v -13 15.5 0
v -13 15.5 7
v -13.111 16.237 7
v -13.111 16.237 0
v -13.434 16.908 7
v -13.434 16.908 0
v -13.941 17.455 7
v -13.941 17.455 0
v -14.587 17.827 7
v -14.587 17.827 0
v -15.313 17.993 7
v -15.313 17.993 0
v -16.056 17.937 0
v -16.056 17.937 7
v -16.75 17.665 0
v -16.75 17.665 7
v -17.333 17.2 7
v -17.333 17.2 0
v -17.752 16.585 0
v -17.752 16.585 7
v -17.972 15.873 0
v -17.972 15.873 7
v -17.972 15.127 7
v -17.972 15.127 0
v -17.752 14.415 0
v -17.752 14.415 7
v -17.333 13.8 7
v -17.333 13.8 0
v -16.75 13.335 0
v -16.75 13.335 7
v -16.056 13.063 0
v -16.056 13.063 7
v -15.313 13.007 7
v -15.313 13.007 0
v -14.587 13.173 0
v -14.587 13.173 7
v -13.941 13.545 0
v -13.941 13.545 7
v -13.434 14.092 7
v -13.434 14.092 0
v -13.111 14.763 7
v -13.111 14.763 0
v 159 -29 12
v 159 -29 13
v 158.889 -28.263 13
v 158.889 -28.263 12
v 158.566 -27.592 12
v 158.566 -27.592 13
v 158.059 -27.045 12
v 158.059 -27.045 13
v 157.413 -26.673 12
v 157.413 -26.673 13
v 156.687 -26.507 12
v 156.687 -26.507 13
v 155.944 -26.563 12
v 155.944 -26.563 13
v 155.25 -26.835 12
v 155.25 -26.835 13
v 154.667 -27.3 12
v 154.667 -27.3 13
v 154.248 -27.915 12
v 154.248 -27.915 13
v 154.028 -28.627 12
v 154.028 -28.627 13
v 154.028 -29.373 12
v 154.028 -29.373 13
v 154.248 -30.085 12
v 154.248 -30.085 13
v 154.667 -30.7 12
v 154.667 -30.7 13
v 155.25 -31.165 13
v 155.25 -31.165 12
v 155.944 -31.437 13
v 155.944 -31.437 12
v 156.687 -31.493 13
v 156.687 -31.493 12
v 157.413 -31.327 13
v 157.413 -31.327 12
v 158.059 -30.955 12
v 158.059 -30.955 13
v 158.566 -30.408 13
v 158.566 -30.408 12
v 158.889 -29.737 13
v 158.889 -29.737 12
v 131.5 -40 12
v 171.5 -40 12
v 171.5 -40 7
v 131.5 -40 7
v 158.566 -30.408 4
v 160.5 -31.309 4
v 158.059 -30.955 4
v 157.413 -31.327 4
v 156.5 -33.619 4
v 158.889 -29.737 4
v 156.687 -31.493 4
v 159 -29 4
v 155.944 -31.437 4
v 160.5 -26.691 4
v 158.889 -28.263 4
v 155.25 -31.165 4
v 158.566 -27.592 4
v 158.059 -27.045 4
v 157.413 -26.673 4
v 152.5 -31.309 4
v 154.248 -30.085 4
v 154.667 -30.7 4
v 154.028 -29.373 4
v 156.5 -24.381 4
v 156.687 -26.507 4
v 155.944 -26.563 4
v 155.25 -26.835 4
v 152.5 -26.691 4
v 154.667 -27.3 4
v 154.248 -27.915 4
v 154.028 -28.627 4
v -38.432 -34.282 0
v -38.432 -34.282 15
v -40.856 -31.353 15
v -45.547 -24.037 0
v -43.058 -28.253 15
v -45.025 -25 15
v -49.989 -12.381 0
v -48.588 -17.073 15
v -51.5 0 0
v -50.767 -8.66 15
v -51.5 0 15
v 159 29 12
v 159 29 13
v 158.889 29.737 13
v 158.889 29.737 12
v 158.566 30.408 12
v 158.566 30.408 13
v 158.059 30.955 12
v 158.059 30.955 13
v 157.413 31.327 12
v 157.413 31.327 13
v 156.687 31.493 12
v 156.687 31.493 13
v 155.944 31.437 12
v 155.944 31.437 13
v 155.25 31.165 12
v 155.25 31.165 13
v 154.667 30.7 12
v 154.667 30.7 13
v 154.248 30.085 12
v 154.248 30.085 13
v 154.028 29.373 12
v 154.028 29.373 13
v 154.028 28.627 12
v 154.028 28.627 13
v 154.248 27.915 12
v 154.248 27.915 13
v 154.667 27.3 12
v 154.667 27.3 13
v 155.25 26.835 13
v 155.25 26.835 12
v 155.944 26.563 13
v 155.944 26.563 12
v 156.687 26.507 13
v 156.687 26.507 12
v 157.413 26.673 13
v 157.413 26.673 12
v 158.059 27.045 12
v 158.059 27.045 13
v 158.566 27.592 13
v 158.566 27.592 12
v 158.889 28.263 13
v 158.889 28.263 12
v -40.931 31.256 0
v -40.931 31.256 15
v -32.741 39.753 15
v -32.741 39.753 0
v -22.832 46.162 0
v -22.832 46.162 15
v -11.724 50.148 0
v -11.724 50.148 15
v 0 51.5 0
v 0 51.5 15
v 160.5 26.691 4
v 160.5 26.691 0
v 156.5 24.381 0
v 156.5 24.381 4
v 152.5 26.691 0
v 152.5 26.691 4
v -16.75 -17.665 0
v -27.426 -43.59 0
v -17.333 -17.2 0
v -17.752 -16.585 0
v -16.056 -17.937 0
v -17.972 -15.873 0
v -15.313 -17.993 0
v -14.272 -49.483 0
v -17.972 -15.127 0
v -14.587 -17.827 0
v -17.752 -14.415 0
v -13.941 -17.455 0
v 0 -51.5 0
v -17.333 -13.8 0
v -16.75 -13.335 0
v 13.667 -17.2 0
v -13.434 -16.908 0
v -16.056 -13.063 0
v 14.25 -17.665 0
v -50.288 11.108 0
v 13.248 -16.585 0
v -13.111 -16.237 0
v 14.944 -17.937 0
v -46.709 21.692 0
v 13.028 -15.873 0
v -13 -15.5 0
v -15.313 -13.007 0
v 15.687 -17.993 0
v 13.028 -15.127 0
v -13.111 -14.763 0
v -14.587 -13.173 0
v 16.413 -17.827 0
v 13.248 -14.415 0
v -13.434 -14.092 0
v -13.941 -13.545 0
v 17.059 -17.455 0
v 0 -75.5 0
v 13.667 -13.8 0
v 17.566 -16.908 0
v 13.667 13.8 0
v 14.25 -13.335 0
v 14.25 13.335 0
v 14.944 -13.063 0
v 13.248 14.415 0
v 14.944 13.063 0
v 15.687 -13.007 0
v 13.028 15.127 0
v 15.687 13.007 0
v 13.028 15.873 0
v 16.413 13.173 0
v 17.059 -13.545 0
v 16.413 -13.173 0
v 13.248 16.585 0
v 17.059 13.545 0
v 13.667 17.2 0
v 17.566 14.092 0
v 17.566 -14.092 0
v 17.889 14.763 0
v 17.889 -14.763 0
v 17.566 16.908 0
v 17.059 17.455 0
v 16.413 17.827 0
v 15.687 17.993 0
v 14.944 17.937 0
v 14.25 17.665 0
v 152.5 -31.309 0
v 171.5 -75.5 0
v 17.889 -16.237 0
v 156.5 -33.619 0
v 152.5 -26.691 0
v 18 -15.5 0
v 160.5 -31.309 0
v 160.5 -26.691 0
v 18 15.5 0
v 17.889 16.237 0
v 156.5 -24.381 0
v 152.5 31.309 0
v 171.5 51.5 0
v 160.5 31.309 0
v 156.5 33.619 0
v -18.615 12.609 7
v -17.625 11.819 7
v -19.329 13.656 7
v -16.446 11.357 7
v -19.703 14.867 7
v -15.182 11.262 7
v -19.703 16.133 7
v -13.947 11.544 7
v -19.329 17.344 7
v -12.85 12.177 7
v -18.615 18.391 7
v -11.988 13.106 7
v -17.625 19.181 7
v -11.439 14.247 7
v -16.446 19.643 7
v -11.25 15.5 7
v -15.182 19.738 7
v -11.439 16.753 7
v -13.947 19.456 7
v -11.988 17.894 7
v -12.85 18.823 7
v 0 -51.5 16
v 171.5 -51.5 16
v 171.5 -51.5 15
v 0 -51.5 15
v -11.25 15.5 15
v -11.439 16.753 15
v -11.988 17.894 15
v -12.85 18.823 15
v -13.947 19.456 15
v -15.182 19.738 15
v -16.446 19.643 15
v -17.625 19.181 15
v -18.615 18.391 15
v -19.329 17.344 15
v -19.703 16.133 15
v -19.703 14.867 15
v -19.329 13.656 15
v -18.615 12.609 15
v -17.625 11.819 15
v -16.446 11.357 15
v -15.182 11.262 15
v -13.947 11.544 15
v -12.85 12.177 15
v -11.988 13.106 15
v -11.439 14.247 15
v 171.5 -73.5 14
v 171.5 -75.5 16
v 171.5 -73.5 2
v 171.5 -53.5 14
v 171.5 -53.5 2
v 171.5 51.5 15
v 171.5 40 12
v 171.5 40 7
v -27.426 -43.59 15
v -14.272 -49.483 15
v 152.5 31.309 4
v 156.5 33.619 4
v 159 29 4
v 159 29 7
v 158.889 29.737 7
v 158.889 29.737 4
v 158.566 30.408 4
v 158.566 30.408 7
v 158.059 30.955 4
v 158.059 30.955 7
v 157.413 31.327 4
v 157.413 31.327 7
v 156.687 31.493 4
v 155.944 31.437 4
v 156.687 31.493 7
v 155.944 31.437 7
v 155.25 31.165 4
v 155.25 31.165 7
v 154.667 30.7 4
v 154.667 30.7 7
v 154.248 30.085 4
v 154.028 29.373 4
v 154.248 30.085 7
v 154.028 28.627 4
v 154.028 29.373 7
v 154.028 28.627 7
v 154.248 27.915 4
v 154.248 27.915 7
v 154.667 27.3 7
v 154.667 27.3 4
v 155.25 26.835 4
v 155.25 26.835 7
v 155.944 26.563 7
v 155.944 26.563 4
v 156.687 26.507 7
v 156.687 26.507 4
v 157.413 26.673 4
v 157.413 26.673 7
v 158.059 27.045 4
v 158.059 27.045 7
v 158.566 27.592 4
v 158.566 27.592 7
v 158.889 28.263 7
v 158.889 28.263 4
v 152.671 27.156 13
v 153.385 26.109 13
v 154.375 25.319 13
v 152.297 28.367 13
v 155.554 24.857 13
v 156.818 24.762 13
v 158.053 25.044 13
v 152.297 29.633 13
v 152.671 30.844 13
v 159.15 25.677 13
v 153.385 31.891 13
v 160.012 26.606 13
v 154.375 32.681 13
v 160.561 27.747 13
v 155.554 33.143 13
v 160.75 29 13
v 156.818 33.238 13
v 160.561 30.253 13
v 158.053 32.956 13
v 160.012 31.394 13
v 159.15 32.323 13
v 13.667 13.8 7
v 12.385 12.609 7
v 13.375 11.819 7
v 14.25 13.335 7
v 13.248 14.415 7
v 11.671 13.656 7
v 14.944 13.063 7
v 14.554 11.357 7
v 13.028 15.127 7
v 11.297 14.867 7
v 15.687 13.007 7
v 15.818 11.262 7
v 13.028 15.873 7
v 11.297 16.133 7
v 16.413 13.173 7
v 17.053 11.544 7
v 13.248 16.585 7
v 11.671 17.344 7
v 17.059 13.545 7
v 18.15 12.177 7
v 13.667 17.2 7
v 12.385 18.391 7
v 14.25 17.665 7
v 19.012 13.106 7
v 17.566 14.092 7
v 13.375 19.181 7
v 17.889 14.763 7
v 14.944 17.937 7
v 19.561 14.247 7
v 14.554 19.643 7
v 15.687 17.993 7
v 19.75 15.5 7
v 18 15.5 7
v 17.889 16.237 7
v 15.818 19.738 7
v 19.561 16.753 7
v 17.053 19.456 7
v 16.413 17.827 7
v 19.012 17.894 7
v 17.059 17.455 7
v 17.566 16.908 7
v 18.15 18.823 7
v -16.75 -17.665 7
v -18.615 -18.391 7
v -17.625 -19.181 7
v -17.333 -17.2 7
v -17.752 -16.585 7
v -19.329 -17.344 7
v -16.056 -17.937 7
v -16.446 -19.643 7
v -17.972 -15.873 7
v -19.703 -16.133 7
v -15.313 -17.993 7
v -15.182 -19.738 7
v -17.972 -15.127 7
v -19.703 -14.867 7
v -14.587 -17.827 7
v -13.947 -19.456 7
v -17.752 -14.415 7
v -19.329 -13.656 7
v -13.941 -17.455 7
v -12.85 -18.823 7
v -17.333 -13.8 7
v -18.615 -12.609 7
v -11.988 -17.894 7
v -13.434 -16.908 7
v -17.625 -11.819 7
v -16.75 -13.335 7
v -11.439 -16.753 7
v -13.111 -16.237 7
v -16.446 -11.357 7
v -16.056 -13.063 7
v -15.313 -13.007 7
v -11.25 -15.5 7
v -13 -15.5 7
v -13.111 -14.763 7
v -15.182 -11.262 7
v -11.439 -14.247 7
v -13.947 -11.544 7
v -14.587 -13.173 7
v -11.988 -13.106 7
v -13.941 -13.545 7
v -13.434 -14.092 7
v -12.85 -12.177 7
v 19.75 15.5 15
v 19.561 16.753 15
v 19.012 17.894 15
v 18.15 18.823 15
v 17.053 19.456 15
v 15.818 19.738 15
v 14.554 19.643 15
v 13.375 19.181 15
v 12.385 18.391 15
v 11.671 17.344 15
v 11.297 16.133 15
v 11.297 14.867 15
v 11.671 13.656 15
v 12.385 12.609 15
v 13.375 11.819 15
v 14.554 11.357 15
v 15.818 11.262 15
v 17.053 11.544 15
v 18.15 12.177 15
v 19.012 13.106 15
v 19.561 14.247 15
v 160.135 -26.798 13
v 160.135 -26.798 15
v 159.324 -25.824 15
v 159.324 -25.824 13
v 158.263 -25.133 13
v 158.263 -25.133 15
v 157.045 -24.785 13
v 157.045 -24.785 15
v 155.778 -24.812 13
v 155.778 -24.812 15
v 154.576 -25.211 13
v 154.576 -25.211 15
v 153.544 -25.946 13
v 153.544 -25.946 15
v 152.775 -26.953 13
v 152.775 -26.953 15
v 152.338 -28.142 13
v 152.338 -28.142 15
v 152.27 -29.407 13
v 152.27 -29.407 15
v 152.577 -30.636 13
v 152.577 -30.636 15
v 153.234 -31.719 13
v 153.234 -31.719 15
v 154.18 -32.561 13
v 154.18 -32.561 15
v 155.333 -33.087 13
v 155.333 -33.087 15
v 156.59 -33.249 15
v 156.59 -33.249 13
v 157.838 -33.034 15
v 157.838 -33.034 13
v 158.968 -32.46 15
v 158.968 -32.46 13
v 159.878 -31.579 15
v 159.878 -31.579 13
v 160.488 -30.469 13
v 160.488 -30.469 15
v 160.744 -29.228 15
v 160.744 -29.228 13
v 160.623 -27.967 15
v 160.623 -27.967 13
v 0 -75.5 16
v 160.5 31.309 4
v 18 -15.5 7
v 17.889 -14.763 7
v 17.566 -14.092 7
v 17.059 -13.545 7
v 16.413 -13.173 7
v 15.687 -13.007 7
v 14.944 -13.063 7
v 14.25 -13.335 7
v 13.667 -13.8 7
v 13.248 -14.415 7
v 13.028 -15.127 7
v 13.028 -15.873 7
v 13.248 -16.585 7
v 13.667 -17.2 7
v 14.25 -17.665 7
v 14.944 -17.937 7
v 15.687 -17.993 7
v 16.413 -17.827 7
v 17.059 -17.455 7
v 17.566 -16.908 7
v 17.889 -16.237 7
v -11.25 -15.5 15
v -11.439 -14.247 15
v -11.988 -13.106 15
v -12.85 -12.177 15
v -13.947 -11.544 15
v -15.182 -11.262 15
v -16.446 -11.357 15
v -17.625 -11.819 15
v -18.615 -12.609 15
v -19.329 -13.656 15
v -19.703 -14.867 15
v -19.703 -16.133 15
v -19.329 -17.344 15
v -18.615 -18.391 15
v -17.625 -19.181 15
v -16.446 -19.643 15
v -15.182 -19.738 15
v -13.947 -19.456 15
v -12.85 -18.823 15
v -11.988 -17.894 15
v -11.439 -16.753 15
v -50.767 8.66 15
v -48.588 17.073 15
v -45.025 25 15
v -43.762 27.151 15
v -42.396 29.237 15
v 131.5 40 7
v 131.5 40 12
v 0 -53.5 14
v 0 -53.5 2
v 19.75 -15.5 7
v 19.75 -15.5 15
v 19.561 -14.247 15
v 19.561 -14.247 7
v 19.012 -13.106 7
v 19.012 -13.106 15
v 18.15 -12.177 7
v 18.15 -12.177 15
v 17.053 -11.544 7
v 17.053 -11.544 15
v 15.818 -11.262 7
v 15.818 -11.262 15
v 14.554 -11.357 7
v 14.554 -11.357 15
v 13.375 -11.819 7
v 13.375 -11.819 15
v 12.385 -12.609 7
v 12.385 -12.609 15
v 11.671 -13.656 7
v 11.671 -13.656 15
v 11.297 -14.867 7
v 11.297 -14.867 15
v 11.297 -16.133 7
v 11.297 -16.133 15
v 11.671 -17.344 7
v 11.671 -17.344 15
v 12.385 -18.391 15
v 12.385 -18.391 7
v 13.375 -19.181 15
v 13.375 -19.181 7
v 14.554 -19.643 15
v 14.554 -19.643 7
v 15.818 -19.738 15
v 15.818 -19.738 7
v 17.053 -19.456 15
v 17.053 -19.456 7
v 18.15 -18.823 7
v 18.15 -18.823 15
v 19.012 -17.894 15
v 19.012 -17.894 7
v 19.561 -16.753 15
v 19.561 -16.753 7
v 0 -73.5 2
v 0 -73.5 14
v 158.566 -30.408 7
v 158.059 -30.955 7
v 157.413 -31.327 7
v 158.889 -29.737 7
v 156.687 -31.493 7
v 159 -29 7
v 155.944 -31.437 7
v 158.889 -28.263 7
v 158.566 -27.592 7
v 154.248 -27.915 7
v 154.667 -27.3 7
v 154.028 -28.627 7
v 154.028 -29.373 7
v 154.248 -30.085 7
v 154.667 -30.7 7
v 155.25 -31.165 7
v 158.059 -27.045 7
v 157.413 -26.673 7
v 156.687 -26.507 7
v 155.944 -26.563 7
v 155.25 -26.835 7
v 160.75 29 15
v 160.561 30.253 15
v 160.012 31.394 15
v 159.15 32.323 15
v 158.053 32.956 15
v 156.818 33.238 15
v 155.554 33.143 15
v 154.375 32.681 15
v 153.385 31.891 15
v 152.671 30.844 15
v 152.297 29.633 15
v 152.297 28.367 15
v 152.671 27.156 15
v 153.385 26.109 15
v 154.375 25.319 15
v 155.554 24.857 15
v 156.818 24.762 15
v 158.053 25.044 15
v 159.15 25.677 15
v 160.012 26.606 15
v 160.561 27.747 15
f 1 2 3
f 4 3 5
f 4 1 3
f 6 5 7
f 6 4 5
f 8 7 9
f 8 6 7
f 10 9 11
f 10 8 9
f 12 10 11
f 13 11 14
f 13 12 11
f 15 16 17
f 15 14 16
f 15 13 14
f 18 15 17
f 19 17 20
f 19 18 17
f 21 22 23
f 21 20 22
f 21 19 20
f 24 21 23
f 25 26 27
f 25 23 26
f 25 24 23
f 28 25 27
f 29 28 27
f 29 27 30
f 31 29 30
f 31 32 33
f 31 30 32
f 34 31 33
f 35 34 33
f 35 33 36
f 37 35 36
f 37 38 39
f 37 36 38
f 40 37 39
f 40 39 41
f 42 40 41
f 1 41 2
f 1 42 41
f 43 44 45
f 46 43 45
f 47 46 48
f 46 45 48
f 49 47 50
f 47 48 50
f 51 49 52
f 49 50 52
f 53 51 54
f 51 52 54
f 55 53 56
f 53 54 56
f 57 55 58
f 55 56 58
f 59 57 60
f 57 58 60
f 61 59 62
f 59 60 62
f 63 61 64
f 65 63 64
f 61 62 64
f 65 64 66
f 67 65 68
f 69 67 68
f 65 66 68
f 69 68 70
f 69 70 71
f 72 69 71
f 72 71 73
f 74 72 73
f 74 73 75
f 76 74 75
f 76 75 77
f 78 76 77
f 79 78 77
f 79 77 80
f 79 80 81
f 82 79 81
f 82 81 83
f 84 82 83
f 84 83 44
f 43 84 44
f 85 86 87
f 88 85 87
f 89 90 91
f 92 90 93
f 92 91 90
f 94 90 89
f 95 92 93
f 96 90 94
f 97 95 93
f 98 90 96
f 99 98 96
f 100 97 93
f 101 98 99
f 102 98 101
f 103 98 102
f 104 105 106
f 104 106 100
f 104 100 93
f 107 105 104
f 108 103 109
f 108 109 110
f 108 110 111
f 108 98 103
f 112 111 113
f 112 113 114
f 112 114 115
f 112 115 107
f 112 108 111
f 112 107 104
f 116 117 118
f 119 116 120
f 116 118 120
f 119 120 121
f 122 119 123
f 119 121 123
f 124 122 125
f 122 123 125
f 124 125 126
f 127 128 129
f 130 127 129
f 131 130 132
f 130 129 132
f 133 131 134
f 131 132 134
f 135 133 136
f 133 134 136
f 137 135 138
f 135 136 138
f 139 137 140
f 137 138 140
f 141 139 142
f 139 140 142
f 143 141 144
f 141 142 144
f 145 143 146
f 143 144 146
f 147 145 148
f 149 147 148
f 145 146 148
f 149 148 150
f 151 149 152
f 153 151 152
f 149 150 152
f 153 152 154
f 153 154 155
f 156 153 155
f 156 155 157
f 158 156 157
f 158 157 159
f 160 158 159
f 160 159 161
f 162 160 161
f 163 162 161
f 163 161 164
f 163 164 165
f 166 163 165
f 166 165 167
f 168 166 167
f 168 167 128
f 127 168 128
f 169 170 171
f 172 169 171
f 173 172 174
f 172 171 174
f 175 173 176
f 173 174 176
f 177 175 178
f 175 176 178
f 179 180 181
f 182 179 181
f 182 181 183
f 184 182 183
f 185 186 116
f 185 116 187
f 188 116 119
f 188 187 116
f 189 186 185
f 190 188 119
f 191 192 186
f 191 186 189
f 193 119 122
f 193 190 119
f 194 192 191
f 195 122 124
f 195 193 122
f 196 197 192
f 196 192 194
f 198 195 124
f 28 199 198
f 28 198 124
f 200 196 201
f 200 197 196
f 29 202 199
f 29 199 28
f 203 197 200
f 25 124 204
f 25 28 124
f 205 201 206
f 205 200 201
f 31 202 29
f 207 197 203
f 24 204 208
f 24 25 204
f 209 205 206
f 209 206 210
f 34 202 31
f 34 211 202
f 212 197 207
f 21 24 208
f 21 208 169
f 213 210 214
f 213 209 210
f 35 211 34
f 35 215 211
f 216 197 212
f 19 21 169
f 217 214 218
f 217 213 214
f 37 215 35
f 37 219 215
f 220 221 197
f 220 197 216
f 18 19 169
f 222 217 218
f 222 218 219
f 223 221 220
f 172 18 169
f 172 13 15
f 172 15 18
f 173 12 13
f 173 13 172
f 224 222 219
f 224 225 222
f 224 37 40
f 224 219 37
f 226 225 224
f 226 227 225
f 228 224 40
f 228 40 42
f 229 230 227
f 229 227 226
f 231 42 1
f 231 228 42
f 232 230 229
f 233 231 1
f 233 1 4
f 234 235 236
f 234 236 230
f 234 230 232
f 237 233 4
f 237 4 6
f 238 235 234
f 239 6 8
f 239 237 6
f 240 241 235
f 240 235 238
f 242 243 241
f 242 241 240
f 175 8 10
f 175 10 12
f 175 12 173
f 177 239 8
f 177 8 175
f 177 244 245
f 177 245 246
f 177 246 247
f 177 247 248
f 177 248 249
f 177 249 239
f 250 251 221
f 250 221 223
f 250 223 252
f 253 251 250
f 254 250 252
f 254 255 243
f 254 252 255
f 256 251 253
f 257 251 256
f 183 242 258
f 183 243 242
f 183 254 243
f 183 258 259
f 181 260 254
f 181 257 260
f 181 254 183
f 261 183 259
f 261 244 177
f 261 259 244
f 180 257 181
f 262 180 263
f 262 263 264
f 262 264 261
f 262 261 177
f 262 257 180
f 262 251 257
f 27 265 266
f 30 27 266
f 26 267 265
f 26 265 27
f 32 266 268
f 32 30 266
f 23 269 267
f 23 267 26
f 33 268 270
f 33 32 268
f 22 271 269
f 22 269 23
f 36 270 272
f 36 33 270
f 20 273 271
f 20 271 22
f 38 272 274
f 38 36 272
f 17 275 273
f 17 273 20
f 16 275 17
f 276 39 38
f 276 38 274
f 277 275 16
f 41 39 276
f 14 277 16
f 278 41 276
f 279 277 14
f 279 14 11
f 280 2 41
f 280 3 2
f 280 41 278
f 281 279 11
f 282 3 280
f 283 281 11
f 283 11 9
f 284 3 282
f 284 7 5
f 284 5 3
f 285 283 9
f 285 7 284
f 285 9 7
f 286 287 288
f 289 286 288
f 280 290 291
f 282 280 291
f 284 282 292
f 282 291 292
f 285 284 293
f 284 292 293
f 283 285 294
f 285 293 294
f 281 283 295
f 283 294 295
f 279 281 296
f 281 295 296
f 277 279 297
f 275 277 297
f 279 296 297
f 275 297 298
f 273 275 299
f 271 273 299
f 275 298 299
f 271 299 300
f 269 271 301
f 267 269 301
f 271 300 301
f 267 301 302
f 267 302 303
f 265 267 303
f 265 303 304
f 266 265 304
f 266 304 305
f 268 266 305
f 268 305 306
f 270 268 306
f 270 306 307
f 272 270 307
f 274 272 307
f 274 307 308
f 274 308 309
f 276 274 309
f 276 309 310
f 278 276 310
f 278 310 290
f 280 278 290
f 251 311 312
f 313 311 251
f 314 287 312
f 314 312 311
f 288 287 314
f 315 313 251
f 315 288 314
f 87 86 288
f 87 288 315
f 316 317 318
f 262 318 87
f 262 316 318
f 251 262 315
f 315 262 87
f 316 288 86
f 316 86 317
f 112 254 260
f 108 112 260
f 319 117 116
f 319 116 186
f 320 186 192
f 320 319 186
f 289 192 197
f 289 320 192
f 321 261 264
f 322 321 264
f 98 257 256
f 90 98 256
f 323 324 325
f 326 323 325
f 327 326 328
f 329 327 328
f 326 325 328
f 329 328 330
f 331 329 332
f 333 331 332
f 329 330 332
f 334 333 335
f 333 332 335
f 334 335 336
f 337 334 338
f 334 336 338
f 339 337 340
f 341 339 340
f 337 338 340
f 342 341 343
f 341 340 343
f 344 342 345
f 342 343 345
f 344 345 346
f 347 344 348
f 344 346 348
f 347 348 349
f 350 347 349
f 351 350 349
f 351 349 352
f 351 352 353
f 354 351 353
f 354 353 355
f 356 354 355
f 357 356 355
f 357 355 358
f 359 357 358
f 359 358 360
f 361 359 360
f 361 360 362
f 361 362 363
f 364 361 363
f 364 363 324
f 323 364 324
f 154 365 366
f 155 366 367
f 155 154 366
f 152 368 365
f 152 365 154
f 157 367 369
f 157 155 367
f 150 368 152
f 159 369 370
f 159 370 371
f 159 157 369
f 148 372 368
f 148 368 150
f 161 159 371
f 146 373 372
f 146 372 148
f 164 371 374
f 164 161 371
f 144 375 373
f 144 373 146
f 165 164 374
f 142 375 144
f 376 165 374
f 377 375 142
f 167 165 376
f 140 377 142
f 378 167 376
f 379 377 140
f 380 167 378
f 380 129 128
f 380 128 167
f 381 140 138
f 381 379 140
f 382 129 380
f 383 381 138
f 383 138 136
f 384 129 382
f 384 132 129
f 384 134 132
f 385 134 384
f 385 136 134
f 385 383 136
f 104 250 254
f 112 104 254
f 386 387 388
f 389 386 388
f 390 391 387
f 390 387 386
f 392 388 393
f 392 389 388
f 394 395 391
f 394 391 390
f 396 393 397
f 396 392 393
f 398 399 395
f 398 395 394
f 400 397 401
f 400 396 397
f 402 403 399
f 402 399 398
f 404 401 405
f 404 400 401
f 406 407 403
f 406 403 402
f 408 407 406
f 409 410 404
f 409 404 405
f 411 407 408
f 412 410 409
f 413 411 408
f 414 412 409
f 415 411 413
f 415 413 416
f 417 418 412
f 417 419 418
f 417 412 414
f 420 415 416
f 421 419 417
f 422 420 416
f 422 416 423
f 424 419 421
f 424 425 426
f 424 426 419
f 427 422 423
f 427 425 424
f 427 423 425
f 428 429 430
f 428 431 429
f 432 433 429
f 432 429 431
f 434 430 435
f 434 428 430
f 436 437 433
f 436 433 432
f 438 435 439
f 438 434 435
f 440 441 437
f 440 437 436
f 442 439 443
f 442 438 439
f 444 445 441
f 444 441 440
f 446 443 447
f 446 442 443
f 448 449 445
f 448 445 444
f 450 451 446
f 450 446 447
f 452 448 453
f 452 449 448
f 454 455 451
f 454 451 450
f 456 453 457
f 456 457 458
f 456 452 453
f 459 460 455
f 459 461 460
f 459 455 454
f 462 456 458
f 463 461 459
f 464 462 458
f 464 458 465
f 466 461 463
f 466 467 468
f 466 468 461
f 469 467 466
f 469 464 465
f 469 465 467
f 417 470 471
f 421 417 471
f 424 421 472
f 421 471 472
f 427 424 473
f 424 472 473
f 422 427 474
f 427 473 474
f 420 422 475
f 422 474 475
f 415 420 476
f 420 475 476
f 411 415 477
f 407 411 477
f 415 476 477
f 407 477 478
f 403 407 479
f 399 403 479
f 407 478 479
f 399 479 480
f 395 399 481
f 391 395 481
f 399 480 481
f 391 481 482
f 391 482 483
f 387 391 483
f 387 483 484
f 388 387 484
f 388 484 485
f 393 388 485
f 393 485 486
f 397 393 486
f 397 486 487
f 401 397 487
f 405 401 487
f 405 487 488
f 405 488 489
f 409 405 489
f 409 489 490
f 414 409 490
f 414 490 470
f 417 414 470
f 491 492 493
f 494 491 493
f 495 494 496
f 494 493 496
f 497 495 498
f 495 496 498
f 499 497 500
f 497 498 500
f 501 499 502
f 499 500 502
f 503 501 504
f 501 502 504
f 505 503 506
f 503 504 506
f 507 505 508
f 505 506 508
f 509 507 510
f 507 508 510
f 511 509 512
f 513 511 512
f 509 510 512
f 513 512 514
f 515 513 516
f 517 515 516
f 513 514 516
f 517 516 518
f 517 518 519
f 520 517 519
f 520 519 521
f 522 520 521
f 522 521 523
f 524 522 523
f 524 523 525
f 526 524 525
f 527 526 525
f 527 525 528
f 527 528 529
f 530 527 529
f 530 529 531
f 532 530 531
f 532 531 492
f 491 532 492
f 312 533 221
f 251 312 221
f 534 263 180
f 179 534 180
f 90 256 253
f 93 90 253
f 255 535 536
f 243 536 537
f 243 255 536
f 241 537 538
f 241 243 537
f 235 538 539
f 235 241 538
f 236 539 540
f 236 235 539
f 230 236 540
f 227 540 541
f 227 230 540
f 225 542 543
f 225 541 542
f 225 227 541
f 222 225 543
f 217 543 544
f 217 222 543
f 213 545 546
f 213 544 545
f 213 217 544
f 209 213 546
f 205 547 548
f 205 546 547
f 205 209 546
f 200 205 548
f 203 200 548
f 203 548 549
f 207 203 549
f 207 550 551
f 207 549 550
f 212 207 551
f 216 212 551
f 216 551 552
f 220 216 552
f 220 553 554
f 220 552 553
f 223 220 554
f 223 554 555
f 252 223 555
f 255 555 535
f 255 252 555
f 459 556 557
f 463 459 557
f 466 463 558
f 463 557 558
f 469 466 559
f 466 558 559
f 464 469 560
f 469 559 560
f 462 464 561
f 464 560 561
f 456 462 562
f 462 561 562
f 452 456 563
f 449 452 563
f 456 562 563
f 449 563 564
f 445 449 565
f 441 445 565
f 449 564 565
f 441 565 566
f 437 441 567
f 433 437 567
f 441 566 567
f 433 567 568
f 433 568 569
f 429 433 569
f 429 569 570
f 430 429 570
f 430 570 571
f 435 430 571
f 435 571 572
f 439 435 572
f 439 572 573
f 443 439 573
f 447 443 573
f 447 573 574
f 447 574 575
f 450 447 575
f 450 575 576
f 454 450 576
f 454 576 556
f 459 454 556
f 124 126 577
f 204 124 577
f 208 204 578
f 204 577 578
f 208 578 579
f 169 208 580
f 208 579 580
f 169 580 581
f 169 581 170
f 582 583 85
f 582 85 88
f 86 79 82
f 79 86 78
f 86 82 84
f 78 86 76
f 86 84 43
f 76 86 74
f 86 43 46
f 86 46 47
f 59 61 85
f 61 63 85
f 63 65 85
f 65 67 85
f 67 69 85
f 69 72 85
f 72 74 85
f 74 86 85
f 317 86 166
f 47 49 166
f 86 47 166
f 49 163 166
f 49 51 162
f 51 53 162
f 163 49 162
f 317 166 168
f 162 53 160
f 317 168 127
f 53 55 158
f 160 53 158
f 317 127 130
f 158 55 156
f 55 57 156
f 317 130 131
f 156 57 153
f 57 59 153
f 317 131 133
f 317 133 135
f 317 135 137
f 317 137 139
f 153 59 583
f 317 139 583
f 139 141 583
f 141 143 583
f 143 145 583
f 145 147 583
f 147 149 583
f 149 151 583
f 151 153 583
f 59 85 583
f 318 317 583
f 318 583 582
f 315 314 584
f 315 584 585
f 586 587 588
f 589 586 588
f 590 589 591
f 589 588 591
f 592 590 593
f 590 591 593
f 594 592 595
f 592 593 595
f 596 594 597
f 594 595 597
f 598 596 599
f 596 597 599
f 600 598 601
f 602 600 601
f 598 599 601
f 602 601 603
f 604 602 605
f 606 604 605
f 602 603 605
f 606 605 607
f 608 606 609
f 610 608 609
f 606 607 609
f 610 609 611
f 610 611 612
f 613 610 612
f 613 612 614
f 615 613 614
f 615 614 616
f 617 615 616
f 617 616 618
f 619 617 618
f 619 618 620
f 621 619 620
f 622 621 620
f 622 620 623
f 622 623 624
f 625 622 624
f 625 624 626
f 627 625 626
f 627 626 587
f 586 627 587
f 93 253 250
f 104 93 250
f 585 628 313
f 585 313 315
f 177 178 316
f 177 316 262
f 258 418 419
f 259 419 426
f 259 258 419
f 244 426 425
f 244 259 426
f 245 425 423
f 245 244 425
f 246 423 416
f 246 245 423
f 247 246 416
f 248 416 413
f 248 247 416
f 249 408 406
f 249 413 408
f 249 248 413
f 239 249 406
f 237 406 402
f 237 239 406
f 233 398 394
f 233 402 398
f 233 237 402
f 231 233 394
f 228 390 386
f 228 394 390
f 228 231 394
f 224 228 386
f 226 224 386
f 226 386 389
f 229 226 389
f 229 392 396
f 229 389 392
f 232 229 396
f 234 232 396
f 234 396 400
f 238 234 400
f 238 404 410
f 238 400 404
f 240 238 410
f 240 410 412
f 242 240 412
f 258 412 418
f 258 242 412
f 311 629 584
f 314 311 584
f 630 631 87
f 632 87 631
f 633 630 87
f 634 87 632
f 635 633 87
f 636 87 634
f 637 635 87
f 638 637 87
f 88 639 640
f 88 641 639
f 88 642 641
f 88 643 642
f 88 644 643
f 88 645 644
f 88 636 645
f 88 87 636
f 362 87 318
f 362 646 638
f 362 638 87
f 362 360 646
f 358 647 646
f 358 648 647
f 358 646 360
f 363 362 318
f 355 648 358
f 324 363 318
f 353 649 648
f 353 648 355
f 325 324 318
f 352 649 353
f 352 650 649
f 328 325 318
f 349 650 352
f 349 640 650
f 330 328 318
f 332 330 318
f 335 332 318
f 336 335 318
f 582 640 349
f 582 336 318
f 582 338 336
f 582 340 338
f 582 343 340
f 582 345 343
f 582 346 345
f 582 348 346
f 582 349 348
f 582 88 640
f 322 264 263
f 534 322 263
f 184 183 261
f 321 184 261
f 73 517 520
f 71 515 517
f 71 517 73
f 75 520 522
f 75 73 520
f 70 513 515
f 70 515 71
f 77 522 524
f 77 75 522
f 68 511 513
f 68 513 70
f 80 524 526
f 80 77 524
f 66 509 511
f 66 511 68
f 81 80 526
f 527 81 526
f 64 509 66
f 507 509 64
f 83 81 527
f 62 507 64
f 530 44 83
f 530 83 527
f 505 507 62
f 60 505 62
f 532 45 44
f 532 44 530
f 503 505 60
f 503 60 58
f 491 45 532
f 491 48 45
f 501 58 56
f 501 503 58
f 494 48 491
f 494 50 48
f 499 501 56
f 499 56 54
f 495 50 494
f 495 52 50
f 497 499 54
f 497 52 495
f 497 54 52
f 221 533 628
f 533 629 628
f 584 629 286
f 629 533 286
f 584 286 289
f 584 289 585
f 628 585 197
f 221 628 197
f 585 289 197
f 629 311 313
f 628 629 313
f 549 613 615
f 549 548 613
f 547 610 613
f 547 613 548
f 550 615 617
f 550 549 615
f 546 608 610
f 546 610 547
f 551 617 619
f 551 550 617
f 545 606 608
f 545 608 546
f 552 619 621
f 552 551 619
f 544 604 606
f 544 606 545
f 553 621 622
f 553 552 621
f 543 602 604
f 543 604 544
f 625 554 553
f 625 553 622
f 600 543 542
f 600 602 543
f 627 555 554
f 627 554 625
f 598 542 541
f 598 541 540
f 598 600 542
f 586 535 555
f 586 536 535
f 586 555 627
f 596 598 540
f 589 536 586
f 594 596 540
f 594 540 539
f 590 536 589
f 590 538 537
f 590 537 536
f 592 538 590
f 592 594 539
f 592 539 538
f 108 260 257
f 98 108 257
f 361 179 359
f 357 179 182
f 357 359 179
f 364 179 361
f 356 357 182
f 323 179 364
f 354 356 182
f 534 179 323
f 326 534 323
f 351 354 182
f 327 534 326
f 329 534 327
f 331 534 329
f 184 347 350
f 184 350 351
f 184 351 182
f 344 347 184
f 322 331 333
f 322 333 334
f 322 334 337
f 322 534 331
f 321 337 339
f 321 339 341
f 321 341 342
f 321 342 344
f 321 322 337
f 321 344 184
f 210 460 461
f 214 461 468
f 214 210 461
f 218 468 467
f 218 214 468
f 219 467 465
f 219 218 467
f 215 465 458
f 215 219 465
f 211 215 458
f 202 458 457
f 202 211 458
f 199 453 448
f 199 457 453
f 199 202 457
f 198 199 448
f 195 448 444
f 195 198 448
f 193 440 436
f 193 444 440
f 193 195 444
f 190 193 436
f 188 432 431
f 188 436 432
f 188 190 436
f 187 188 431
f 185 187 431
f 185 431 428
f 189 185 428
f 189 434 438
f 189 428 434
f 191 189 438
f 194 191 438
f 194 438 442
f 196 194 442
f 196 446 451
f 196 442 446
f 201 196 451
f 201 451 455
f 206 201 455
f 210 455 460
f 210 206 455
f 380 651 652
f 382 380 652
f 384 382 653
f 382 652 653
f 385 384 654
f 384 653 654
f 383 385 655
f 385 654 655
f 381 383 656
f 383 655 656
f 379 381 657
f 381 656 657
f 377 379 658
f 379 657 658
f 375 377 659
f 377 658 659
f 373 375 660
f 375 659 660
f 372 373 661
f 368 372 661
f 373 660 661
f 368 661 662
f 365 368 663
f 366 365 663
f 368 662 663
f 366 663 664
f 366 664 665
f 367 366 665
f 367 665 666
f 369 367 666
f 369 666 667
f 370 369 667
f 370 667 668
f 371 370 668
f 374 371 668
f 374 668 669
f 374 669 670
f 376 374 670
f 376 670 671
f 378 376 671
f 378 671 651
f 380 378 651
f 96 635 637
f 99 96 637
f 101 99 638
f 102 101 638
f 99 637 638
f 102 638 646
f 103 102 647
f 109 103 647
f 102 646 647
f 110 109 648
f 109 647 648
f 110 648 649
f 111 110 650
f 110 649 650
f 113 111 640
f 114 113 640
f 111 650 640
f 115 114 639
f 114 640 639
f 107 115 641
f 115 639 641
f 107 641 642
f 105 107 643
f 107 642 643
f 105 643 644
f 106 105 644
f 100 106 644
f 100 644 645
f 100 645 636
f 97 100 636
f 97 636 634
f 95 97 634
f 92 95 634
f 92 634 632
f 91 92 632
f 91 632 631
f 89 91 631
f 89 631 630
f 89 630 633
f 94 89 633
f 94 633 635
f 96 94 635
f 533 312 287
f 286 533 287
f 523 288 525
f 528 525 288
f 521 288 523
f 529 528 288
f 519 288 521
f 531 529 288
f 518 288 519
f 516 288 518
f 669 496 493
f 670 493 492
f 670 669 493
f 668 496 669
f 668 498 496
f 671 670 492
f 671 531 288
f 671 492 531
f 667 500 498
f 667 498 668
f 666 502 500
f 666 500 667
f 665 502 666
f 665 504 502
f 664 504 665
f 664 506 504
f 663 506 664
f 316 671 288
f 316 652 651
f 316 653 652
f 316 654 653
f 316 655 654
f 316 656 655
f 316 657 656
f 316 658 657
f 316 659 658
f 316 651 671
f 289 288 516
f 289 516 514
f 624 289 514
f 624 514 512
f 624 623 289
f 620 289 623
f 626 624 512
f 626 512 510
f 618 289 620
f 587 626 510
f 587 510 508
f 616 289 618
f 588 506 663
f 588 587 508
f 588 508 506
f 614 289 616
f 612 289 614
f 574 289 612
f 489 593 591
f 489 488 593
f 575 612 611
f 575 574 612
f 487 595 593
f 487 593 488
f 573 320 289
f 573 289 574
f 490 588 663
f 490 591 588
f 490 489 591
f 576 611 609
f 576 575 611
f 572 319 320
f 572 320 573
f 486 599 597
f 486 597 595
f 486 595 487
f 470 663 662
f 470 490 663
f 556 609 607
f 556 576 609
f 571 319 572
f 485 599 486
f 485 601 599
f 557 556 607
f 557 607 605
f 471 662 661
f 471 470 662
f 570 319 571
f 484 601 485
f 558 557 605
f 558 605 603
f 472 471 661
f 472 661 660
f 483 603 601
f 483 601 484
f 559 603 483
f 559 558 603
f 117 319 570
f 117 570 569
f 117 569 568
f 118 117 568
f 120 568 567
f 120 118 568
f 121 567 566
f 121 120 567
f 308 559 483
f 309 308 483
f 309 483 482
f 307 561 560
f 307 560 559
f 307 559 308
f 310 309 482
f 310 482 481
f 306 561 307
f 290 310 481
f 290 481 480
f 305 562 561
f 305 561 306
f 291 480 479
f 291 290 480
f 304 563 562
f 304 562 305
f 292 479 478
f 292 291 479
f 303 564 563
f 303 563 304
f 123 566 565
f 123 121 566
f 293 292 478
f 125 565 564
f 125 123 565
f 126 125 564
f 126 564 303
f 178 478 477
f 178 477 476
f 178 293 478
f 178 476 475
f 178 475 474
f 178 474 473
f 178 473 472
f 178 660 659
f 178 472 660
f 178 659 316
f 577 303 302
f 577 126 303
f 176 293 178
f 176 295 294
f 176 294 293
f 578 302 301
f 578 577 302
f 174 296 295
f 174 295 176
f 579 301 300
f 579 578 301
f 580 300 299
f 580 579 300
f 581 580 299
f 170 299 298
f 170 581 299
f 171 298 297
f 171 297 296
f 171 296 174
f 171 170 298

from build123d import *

# Parameters (mm, degrees)
CROQUIS1_W                        = 103
CROQUIS1_H                        = 103
CROQUIS1_R                        = 2.5
SALIENTE_EXTRUIR1_DEPTH           = 15
REDONDEO2_R                       = 51.5
CROQUIS2_W                        = 15
CROQUIS2_H                        = 103
SALIENTE_EXTRUIR2_DEPTH           = 120
CROQUIS3_R                        = 4.25
CORTAR_EXTRUIR1_DEPTH             = 8
SALIENTE_EXTRUIR3_START           = -223
SALIENTE_EXTRUIR3_DEPTH           = 223
CORTAR_EXTRUIR2_DEPTH             = 181.53669987
CORTAR_EXTRUIR2_DEPTH_BACK        = 181.53669987
REDONDEO3_START                   = -23.965772234
REDONDEO3_DEPTH                   = 195.465772234
REDONDEO3_START_2                 = -45.024993159
REDONDEO3_2_DEPTH                 = 21.059220925
REDONDEO3_START_3                 = 15
REDONDEO3_3_DEPTH                 = 9
REDONDEO4_R                       = 10
CORTAR_EXTRUIR3_REACH             = 182.537
CROQUIS6_R                        = 4.25
CORTAR_EXTRUIR3_DIRECTION_2_DEPTH = 181.536699978
CORTAR_EXTRUIR4_DEPTH             = 231.022281636
CORTAR_EXTRUIR4_DEPTH_BACK        = 40
CROQUIS7_W                        = 5
CROQUIS7_H                        = 80
CROQUIS10_R                       = 4.25
CORTAR_EXTRUIR5_DEPTH             = 10
CROQUIS11_R                       = 2.5
CORTAR_EXTRUIR6_DEPTH             = 180.536904387
CROQUIS12_W                       = 16
CROQUIS12_H                       = 24
CROQUIS12_W_2                     = 12
CROQUIS12_H_2                     = 20
SALIENTE_EXTRUIR4_DEPTH           = 171.5
CORTAR_EXTRUIR7_DEPTH             = 4
CROQUIS14_W                       = 242.583484446
CROQUIS14_H                       = 103.867159029
CORTAR_EXTRUIR8_DEPTH             = 8


with BuildPart() as part:
    # Croquis1 → Saliente-Extruir1 (new body)
    with BuildSketch(Plane.XY):
        Rectangle(CROQUIS1_W, CROQUIS1_H)
        with Locations((15.5, 15.5)):
            Circle(CROQUIS1_R, mode=Mode.SUBTRACT)
        with Locations((-15.5, 15.5)):
            Circle(CROQUIS1_R, mode=Mode.SUBTRACT)
        with Locations((-15.5, -15.5)):
            Circle(CROQUIS1_R, mode=Mode.SUBTRACT)
        with Locations((15.5, -15.5)):
            Circle(CROQUIS1_R, mode=Mode.SUBTRACT)
    extrude(amount=SALIENTE_EXTRUIR1_DEPTH)

    # Redondeo2
    redondeo2_edges = [part.edges().sort_by_distance(p)[0] for p in [
        (-51.5, -51.5, 7.5),
        (-51.5, 51.5, 7.5),
    ]]
    fillet(redondeo2_edges, radius=REDONDEO2_R - 0.0001)  # a hair under: the kernel refuses the full size

    # Croquis2 → Saliente-Extruir2 (add)
    with BuildSketch(Plane(origin=(51.5, 0, 0), x_dir=(0, 0, -1), z_dir=(1, 0, 0))):
        with Locations((-7.5, 0)):
            Rectangle(CROQUIS2_W, CROQUIS2_H)
    extrude(amount=SALIENTE_EXTRUIR2_DEPTH)

    # Croquis3 → Cortar-Extruir1 (cut)
    with BuildSketch(Plane.XY.offset(15)):
        with Locations((-15.5, 15.5)):
            Circle(CROQUIS3_R)
        with Locations((15.5, 15.5)):
            Circle(CROQUIS3_R)
        with Locations((15.5, -15.5)):
            Circle(CROQUIS3_R)
        with Locations((-15.5, -15.5)):
            Circle(CROQUIS3_R)
    extrude(amount=-CORTAR_EXTRUIR1_DEPTH, mode=Mode.SUBTRACT)

    # Croquis4 → Saliente-Extruir3 (add)
    with BuildSketch(Plane(origin=(171.5, 0, 0), x_dir=(0, 0, -1), z_dir=(1, 0, 0)).offset(SALIENTE_EXTRUIR3_START)):
        Polygon((-15, -19), (-15, -25), (-23, -25), (-23, 25), (-15, 25), (-15, 19), (-19, 19), (-19, -19), align=None)
    extrude(amount=SALIENTE_EXTRUIR3_DEPTH)

    # Croquis5 → Cortar-Extruir2 (cut, two sides: drawn at the far end of the back side and taken through both)
    with BuildSketch(Plane(origin=(0, 0, 0), x_dir=(-1, 0, 0), z_dir=(0, 0, -1)).offset(-CORTAR_EXTRUIR2_DEPTH_BACK)):
        with BuildLine():
            Line((40.930864284, 31.255629077), (61.422564692, 30.315306135))
            Line((61.422564692, 30.315306135), (63.075048064, -35.056936027))
            Line((63.075048064, -35.056936027), (38.432028807, -34.281615507))
            ThreePointArc((38.432028807, -34.281615507), (48.122237498, -18.343943366), (51.5, 0))
            ThreePointArc((51.5, 0), (48.786214808, 16.497128377), (40.930864284, 31.255629077))
        make_face()
    extrude(amount=CORTAR_EXTRUIR2_DEPTH + CORTAR_EXTRUIR2_DEPTH_BACK, mode=Mode.SUBTRACT)

    # Redondeo3: read off the stored shape, not the designer's step
    # Redondeo3 outline → Redondeo3 (add)
    with BuildSketch(Plane.YZ.offset(REDONDEO3_START)):
        with BuildLine():
            Line((-25, 15), (-25, 23))
            ThreePointArc((-25, 23), (-28.473403651, 17.254033308), (-34.797958971, 15))
            Line((-34.797958971, 15), (-25, 15))
        make_face()
        with BuildLine():
            ThreePointArc((34.797958971, 15), (28.473403651, 17.254033308), (25, 23))
            Line((25, 23), (25, 15))
            Line((25, 15), (34.797958971, 15))
        make_face()
    extrude(amount=REDONDEO3_DEPTH)

    # Redondeo3 2 outline → Redondeo3 2 (add)
    with BuildSketch(Plane.YZ.offset(REDONDEO3_START_2)):
        with BuildLine():
            ThreePointArc((34.797958971, 15), (28.473403651, 17.254033308), (25, 23))
            Line((25, 23), (25, 15))
            Line((25, 15), (34.797958971, 15))
        make_face()
        with BuildLine():
            Line((-25, 15), (-25, 23))
            ThreePointArc((-25, 23), (-28.473403651, 17.254033308), (-34.797958971, 15))
            Line((-34.797958971, 15), (-25, 15))
        make_face()
    extrude(amount=REDONDEO3_2_DEPTH)

    # Redondeo3 3 outline → Redondeo3 3 (cut)
    with BuildSketch(Plane.XY.offset(REDONDEO3_START_3)):
        with BuildLine():
            Line((-45.024993159, -36), (-36.827299657, -36))
            ThreePointArc((-36.827299657, -36), (-41.294060795, -30.774186311), (-45.024993083, -24.999999958))
            Line((-45.024993083, -24.999999958), (-45.024993159, -36))
        make_face()
        with BuildLine():
            Line((-45.024993159, 36), (-45.024993083, 24.999999958))
            ThreePointArc((-45.024993083, 24.999999958), (-41.294060795, 30.774186311), (-36.827299657, 36))
            Line((-36.827299657, 36), (-45.024993159, 36))
        make_face()
    extrude(amount=REDONDEO3_3_DEPTH, mode=Mode.SUBTRACT)

    # Redondeo4
    redondeo4_edges = [part.edges().sort_by_distance(p)[0] for p in [
        (63.237503445, -25, 23),
        (63.237503445, 25, 23),
    ]]
    fillet(redondeo4_edges, radius=REDONDEO4_R)

    # Croquis6 → Cortar-Extruir3 (cut, up to next)
    with BuildSketch(Plane.XY.offset(23), mode=Mode.PRIVATE) as cortar_extruir3_sk1:
        with Locations((15.5, 15.5)):
            Circle(CROQUIS6_R)
    cortar_extruir3_tool1 = extrude(cortar_extruir3_sk1.sketch, amount=-CORTAR_EXTRUIR3_REACH, mode=Mode.PRIVATE) & part.part
    # Croquis6 → Cortar-Extruir3 (cut, up to next)
    with BuildSketch(Plane.XY.offset(23), mode=Mode.PRIVATE) as cortar_extruir3_sk2:
        with Locations((-15.5, 15.5)):
            Circle(CROQUIS6_R)
    cortar_extruir3_tool2 = extrude(cortar_extruir3_sk2.sketch, amount=-CORTAR_EXTRUIR3_REACH, mode=Mode.PRIVATE) & part.part
    # Croquis6 → Cortar-Extruir3 (cut, up to next)
    with BuildSketch(Plane.XY.offset(23), mode=Mode.PRIVATE) as cortar_extruir3_sk3:
        with Locations((15.5, -15.5)):
            Circle(CROQUIS6_R)
    cortar_extruir3_tool3 = extrude(cortar_extruir3_sk3.sketch, amount=-CORTAR_EXTRUIR3_REACH, mode=Mode.PRIVATE) & part.part
    # Croquis6 → Cortar-Extruir3 (cut, up to next)
    with BuildSketch(Plane.XY.offset(23), mode=Mode.PRIVATE) as cortar_extruir3_sk4:
        with Locations((-15.5, -15.5)):
            Circle(CROQUIS6_R)
    cortar_extruir3_tool4 = extrude(cortar_extruir3_sk4.sketch, amount=-CORTAR_EXTRUIR3_REACH, mode=Mode.PRIVATE) & part.part
    add(cortar_extruir3_tool1.solids().sort_by_distance((15.5, 15.5, 23))[0], mode=Mode.SUBTRACT)
    add(cortar_extruir3_tool2.solids().sort_by_distance((-15.5, 15.5, 23))[0], mode=Mode.SUBTRACT)
    add(cortar_extruir3_tool3.solids().sort_by_distance((15.5, -15.5, 23))[0], mode=Mode.SUBTRACT)
    add(cortar_extruir3_tool4.solids().sort_by_distance((-15.5, -15.5, 23))[0], mode=Mode.SUBTRACT)

    # Croquis6 → Cortar-Extruir3 direction 2 (cut)
    with BuildSketch(Plane.XY.offset(23)):
        with Locations((15.5, 15.5)):
            Circle(CROQUIS6_R)
        with Locations((-15.5, 15.5)):
            Circle(CROQUIS6_R)
        with Locations((15.5, -15.5)):
            Circle(CROQUIS6_R)
        with Locations((-15.5, -15.5)):
            Circle(CROQUIS6_R)
    extrude(amount=CORTAR_EXTRUIR3_DIRECTION_2_DEPTH, mode=Mode.SUBTRACT)

    # Croquis7 → Cortar-Extruir4 (cut, two sides: drawn at the far end of the back side and taken through both)
    with BuildSketch(Plane(origin=(171.5, 0, 0), x_dir=(0, 0, -1), z_dir=(1, 0, 0)).offset(-CORTAR_EXTRUIR4_DEPTH_BACK)):
        with Locations((-9.5, 0)):
            Rectangle(CROQUIS7_W, CROQUIS7_H)
    extrude(amount=CORTAR_EXTRUIR4_DEPTH + CORTAR_EXTRUIR4_DEPTH_BACK, mode=Mode.SUBTRACT)

    # Croquis10 → Cortar-Extruir5 (cut)
    with BuildSketch(Plane.XY.offset(23)):
        with Locations((156.5, 29)):
            Circle(CROQUIS10_R)
        with Locations(Location((156.5, -29, 0), (0, 0, 31.206732466))):
            Circle(CROQUIS10_R)
    extrude(amount=-CORTAR_EXTRUIR5_DEPTH, mode=Mode.SUBTRACT)

    # Croquis11 → Cortar-Extruir6 (cut, through all)
    with BuildSketch(Plane.XY.offset(13)):
        with Locations((156.5, 29)):
            Circle(CROQUIS11_R)
        with Locations((156.5, -29)):
            Circle(CROQUIS11_R)
    extrude(amount=-CORTAR_EXTRUIR6_DEPTH, mode=Mode.SUBTRACT)

    # Croquis12 → Saliente-Extruir4 (add)
    with BuildSketch(Plane(origin=(171.5, 0, 0), x_dir=(0, 0, -1), z_dir=(1, 0, 0))):
        with Locations((-8, -63.5)):
            Rectangle(CROQUIS12_W, CROQUIS12_H)
        with Locations((-8, -63.5)):
            Rectangle(CROQUIS12_W_2, CROQUIS12_H_2, mode=Mode.SUBTRACT)
    extrude(amount=-SALIENTE_EXTRUIR4_DEPTH)

    # Croquis13 → Cortar-Extruir7 (cut)
    with BuildSketch(Plane(origin=(0, 0, 0), x_dir=(-1, 0, 0), z_dir=(0, 0, -1))):
        Polygon((-156.5, 24.381197846), (-152.5, 26.690598923), (-152.5, 31.309401077), (-156.5, 33.618802154), (-160.5, 31.309401077), (-160.5, 26.690598923), align=None)
        Polygon((-152.5, -26.690598923), (-156.5, -24.381197846), (-160.5, -26.690598923), (-160.5, -31.309401077), (-156.5, -33.618802154), (-152.5, -31.309401077), align=None)
    extrude(amount=-CORTAR_EXTRUIR7_DEPTH, mode=Mode.SUBTRACT)

    # Croquis14 → Cortar-Extruir8 (cut)
    with BuildSketch(Plane.XY.offset(23)):
        with Locations((50.208257777, 0.433579514)):
            Rectangle(CROQUIS14_W, CROQUIS14_H)
    extrude(amount=-CORTAR_EXTRUIR8_DEPTH, mode=Mode.SUBTRACT)


solid = part.part
